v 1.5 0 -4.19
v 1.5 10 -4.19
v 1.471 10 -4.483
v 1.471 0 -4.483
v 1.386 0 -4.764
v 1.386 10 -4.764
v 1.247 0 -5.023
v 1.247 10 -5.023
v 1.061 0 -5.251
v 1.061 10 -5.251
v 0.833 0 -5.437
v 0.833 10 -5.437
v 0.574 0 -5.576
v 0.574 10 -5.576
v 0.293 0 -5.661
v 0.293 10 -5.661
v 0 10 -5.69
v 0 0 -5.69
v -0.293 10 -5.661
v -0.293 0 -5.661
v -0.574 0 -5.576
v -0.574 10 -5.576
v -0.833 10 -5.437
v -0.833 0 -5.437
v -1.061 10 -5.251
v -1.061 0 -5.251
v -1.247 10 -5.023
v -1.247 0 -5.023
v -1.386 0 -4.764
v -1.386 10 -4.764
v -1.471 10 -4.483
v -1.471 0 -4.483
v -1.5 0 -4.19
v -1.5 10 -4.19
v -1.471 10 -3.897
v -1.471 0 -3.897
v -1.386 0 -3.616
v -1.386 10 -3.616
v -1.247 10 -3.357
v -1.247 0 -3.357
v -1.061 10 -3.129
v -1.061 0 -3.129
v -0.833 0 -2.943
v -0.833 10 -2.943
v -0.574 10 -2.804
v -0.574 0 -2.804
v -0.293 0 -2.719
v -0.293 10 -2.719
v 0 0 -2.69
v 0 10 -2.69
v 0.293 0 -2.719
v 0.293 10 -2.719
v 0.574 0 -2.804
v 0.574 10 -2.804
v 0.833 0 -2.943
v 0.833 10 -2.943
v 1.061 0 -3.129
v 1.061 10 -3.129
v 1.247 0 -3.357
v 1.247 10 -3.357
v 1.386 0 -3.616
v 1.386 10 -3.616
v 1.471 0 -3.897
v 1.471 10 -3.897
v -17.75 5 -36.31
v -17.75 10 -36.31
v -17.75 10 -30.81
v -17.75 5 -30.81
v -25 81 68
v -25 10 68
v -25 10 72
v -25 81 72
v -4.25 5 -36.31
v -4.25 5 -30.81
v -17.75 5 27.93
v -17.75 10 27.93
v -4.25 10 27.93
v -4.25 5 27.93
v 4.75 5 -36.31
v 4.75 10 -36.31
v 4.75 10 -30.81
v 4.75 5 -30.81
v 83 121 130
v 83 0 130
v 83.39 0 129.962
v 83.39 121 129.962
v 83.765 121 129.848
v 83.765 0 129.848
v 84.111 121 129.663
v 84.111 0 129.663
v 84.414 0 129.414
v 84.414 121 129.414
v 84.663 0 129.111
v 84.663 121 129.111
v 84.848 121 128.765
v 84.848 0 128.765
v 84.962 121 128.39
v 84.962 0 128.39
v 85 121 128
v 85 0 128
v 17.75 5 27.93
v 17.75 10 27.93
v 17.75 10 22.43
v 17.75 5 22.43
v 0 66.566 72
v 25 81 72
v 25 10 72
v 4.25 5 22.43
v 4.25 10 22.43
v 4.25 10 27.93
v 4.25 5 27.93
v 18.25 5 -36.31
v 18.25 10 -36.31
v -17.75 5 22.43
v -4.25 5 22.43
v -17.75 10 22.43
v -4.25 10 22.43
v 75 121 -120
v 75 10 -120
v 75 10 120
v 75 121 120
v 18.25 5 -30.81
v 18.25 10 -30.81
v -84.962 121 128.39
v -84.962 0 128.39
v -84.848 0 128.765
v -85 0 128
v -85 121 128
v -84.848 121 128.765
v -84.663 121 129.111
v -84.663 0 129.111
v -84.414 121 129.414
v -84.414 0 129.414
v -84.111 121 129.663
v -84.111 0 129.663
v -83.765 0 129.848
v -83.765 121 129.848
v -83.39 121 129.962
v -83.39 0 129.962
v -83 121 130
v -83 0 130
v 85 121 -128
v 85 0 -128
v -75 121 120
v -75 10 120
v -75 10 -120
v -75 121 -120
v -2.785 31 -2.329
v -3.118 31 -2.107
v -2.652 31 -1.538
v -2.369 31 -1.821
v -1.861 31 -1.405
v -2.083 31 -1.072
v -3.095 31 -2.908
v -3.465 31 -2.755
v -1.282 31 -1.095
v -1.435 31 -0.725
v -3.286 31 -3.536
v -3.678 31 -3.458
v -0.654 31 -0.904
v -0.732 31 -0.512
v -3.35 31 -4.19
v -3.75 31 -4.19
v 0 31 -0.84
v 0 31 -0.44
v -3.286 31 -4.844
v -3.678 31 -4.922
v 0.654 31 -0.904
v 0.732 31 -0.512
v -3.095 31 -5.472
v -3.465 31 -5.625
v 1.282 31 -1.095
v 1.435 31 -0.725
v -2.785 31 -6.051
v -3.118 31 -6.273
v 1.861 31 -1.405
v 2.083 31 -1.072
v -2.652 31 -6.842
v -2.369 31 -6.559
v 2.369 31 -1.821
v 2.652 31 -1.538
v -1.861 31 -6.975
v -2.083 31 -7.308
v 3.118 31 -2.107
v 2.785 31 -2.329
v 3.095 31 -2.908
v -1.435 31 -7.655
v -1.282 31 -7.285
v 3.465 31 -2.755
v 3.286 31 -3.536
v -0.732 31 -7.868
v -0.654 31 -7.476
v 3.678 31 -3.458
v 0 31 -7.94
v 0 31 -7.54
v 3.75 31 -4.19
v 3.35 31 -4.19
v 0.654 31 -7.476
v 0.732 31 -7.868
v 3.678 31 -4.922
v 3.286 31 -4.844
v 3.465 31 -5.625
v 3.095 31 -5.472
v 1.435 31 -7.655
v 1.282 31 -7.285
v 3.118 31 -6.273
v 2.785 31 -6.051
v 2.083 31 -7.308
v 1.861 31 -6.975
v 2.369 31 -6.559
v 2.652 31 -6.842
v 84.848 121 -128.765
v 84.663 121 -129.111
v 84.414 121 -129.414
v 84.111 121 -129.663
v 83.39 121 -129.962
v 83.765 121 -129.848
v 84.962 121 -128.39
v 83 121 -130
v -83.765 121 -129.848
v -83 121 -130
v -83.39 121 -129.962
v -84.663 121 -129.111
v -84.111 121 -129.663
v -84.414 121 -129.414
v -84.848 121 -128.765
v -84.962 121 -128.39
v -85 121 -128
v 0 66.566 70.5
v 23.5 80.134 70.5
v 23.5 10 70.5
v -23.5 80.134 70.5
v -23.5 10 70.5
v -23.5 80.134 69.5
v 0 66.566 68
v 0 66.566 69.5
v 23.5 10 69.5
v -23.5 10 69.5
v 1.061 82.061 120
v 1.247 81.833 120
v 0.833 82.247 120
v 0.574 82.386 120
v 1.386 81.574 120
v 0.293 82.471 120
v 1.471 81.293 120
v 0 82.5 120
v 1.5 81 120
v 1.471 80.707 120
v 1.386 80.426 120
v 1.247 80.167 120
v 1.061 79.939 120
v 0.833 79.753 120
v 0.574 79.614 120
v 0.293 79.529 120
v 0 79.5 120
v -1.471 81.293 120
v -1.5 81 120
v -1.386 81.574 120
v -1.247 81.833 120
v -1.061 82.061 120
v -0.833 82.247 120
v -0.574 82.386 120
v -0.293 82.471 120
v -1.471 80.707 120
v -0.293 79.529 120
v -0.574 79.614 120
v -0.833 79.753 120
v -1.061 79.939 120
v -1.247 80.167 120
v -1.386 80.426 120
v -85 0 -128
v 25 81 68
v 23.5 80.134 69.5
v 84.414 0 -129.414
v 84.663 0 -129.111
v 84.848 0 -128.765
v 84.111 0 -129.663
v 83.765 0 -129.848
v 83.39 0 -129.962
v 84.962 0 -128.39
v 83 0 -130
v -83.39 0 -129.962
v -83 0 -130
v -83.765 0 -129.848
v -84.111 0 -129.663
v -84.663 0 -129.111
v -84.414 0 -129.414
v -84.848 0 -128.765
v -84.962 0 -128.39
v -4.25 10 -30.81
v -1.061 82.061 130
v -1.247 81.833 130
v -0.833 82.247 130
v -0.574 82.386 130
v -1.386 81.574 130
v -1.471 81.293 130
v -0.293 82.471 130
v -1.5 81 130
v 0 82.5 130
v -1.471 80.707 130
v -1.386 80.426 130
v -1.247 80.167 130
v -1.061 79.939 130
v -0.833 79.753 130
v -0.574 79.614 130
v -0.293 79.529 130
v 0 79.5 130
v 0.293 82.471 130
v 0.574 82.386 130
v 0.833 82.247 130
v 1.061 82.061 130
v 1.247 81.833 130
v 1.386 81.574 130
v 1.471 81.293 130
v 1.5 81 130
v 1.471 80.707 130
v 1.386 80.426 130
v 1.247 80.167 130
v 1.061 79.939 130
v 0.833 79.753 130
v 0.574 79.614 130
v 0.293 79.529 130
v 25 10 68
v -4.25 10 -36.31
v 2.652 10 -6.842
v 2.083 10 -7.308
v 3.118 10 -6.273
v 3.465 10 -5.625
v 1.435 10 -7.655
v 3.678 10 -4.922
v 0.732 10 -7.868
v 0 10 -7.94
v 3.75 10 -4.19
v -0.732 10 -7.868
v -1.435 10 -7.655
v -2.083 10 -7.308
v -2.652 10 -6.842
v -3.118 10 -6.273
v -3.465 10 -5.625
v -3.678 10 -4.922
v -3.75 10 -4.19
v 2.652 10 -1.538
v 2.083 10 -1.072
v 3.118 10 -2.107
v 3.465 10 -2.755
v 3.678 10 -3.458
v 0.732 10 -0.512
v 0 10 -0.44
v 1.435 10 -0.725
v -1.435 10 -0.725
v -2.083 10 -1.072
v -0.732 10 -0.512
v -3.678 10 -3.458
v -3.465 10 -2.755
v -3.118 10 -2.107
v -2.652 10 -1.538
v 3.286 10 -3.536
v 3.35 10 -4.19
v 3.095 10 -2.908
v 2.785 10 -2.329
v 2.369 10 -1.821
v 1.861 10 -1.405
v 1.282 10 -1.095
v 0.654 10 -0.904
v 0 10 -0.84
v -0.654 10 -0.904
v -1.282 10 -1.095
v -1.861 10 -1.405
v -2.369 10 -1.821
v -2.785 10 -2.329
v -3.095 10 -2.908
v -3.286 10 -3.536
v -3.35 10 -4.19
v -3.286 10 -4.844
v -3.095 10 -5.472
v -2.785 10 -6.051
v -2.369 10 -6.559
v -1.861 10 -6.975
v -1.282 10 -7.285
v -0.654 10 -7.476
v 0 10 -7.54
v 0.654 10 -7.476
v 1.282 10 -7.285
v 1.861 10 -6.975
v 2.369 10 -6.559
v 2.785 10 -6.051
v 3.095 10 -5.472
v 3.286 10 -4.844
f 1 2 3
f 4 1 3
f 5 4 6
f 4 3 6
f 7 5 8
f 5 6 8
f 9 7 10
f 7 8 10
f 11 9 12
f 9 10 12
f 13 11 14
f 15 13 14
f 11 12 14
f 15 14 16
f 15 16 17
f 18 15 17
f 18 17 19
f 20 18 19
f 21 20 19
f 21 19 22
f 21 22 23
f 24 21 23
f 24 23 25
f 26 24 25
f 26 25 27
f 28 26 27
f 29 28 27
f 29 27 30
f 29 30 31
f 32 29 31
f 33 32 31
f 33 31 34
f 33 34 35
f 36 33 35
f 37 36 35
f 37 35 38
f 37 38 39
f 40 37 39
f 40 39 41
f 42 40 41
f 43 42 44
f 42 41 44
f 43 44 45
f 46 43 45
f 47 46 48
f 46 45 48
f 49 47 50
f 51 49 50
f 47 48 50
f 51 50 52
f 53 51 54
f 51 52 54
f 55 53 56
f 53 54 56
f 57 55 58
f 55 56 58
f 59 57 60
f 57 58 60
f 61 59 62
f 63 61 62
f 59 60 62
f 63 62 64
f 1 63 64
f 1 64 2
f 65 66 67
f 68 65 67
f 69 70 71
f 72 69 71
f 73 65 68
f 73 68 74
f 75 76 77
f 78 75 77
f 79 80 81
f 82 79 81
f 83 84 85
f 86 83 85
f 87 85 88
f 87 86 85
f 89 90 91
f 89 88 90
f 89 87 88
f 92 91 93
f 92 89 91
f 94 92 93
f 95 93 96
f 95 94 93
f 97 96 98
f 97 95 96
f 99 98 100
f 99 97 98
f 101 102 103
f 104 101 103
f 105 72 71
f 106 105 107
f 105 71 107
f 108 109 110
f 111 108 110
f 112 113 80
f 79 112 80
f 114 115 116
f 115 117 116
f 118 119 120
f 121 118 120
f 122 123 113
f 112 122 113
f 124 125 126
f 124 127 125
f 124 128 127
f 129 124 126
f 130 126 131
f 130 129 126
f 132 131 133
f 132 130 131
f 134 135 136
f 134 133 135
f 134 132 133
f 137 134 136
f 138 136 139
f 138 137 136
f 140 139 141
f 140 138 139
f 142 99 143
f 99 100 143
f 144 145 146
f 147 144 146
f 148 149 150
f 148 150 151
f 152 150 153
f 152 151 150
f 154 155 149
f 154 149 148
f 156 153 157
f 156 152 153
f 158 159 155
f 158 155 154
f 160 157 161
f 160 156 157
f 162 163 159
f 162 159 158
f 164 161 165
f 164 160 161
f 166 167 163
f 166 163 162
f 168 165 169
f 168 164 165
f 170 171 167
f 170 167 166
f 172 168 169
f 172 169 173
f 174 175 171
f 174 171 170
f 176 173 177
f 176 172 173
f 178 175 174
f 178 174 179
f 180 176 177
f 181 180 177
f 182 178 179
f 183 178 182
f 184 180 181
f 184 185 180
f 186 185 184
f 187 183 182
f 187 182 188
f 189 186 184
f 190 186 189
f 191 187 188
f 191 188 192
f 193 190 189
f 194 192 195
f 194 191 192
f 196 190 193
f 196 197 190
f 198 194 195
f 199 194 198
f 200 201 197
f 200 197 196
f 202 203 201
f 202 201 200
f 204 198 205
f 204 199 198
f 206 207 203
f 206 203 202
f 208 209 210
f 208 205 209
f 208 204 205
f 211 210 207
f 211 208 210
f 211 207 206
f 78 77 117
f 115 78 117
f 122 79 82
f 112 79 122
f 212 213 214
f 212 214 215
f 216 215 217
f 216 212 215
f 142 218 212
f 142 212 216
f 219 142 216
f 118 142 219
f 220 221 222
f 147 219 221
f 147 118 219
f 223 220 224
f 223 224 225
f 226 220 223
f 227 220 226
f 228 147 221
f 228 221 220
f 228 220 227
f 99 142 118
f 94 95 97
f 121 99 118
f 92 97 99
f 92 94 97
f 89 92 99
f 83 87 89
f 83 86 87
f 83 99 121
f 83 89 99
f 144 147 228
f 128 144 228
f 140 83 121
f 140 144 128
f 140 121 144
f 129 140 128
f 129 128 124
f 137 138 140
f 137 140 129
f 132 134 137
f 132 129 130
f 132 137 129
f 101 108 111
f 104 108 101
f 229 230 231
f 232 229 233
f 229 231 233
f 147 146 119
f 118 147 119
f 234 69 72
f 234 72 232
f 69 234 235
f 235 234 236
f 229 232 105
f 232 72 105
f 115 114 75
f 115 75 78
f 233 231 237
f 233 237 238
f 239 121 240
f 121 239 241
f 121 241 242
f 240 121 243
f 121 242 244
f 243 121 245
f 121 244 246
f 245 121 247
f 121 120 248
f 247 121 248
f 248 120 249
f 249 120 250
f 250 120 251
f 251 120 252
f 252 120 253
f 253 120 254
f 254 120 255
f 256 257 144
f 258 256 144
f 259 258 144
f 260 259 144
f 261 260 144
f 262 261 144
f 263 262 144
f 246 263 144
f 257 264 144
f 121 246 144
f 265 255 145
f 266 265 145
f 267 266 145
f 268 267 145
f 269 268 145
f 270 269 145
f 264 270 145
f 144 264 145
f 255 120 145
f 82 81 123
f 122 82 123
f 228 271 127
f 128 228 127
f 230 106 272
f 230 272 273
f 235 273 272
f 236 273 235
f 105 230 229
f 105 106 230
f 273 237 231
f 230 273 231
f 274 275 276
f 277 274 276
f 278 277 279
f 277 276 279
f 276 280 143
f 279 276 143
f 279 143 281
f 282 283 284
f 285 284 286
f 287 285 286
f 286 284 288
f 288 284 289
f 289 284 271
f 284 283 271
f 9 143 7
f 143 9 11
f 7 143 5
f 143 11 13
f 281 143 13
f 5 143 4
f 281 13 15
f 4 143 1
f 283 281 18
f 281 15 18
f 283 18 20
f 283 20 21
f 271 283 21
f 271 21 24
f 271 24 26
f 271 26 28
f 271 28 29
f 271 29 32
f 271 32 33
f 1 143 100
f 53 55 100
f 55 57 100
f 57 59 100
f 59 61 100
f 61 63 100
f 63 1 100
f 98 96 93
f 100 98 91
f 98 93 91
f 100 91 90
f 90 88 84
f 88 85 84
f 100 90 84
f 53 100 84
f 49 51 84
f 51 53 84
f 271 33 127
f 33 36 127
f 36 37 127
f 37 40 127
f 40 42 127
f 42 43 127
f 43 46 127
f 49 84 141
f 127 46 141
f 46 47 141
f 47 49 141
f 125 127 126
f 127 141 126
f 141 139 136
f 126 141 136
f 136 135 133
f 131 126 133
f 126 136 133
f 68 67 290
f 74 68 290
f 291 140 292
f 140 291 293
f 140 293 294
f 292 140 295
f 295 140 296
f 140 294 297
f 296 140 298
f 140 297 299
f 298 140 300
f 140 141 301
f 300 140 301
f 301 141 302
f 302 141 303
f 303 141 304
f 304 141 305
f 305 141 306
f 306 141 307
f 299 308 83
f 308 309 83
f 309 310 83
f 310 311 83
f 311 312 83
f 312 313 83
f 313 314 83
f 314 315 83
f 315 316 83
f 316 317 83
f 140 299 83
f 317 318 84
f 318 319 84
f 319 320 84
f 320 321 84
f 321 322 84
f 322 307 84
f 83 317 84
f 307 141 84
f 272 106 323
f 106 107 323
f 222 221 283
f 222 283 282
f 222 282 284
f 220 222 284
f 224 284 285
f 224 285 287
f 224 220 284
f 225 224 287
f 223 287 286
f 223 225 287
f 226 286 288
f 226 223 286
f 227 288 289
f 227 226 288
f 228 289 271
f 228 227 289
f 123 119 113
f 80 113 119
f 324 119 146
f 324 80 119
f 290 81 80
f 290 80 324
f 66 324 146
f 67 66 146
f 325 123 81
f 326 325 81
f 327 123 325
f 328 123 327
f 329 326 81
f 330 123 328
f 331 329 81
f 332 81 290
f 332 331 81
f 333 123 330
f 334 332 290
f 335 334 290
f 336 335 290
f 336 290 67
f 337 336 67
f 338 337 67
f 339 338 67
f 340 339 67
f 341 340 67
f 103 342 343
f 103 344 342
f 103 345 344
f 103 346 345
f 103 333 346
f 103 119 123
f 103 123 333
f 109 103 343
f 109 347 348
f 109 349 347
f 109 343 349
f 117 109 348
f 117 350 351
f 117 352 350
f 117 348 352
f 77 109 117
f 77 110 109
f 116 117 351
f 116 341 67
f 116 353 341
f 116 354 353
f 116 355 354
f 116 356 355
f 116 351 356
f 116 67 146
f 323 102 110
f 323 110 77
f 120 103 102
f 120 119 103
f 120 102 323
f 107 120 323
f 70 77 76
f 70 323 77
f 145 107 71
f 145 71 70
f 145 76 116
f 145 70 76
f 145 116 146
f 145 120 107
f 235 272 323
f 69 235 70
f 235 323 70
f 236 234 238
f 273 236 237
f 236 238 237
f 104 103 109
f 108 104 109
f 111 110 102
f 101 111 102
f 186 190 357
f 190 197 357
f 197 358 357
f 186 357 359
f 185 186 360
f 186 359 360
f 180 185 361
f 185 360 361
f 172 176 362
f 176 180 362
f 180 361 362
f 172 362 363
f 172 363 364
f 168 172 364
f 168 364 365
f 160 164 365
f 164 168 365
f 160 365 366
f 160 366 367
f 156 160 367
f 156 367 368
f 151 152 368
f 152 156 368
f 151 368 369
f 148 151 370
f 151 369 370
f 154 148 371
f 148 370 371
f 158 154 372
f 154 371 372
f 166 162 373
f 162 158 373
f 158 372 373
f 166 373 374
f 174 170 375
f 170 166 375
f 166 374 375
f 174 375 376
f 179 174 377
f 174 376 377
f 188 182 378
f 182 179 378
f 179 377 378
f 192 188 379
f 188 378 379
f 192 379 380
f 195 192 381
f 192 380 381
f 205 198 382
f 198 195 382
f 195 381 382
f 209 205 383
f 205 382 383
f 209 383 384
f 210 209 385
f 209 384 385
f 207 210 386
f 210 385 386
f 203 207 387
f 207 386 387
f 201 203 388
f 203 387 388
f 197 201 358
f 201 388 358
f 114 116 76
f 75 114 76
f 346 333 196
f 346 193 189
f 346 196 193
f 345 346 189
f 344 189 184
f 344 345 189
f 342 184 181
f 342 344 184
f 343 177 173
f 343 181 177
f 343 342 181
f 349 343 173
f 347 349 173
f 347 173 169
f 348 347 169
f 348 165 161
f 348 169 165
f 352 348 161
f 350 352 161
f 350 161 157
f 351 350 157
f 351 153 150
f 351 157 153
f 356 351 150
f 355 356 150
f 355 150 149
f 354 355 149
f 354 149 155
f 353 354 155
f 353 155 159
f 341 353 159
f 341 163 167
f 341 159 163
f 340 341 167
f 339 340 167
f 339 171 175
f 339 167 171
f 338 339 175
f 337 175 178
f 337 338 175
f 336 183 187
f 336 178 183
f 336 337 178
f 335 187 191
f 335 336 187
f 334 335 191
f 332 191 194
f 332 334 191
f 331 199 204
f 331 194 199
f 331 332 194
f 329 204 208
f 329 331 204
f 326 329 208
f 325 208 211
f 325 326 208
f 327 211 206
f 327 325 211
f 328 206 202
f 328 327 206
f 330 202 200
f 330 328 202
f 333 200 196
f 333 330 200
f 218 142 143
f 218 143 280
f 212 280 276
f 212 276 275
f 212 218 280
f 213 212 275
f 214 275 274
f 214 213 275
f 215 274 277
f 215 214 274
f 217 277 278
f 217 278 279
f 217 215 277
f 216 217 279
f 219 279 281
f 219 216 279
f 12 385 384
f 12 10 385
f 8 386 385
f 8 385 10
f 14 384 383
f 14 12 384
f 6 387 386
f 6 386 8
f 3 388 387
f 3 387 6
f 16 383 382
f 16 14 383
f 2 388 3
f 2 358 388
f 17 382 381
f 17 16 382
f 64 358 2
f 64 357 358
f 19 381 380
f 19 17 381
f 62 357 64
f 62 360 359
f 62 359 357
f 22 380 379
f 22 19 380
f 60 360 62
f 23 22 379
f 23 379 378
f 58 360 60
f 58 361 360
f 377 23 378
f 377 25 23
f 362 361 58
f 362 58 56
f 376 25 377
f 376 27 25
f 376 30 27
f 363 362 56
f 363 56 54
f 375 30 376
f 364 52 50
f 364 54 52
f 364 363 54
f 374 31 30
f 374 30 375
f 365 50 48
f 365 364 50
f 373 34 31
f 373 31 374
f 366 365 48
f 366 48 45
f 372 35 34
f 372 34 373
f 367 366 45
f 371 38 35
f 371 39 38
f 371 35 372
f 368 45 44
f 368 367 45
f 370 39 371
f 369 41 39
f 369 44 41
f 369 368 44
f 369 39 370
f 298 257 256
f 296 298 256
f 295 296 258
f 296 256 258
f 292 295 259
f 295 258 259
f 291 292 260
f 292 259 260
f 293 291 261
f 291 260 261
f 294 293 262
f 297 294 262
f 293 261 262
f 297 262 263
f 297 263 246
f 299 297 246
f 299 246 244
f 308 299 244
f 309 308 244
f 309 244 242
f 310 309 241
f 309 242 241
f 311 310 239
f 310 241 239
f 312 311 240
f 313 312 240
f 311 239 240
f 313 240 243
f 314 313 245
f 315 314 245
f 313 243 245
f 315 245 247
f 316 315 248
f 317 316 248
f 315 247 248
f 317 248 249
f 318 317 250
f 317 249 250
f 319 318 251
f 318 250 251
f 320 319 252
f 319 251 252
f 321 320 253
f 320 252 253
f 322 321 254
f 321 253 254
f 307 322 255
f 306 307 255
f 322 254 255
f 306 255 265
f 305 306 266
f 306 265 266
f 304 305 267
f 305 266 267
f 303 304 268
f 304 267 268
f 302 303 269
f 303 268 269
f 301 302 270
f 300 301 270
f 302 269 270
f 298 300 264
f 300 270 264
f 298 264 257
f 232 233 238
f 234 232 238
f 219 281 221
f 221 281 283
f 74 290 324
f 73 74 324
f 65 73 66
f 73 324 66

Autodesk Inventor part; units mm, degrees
ref_plane "YZ Plane" through (0, 0, 0) normal (1, 0, 0) x (0, 1, 0)
ref_plane "XZ Plane" through (0, 0, 0) normal (0, 1, 0) x (-1, 0, 0)
ref_plane "XY Plane" through (0, 0, 0) normal (0, 0, 1) x (1, 0, 0)
sketch "Boceto1" plane through (0, 0, 0) normal (0, 1, 0) x (-1, 0, 0)
  line L0 (-85, -130) -> (85, -130)
  line L1 (85, -130) -> (85, 130)
  line L2 (85, 130) -> (-85, 130)
  line L3 (-85, 130) -> (-85, -130)
  line L4 (-85, -130) -> (85, 130) construction
  line L5 (85, -130) -> (-85, 130) construction
  line L6 (75, 120) -> (75, -120)
  line L7 (75, -120) -> (-75, -120)
  line L8 (-75, -120) -> (-75, 120)
  line L9 (-75, 120) -> (75, 120)
  point P0 (0, 0)
  point P1 (0, -120)
  point P2 (0, 120)
  point P3 (0, 0)
  dimension "d0" = 170
  dimension "d1" = 260
  dimension "d10" = 10
extrude "Extrusión1" add sketch "Boceto1" along normal blind 121
extrude "Extrusión3" add sketch "Boceto1" along normal blind 10 contours L6 L7 L8 L9
sketch "Boceto4" plane through (0, 10, 0) normal (0, 1, 0) x (1, 0, 0)
  circle A0 centre (0, 4.19) radius 3.75
  line L0 (85, 130) -> (-85, 130) projected
  circle A1 centre (0, 4.19) radius 3.35
  circle A2 centre (0, 4.19) radius 1.5
  line L1 (-85, -130) -> (85, -130) projected
  line L2 (75, -120) -> (-75, -120) construction
  line L3 (0, -120) -> (0, -70) construction
  point P0 (0, 0)
  dimension "d15" = 7.5
  dimension "d17" = 0.4
  dimension "d20" = 3
  dimension "d23" = 134.19
  dimension "d36" = 50
extrude "Extrusión4" add sketch "Boceto4" along normal blind 21 contours A0
extrude "Extrusión5" cut sketch "Boceto4" against normal blind 10 contours A2
sketch "Boceto7" plane through (0, 10, 0) normal (0, 1, 0) x (1, 0, 0)
  circle A0 centre (0, 4.19) radius 1.5 construction
  line L0 (0, 4.19) -> (-17.5, 4.19) construction
  circle A1 centre (0, 4.19) radius 1.5 construction
  line L1 (0, 4.19) -> (0, -27.68) construction
  line L2 (75, -120) -> (-75, -120) construction
  line L3 (0, -120) -> (0, -70) construction
  line L4 (0, -70) -> (-19.0745, -70) construction
  line L5 (25, -68) -> (-25, -68)
  line L6 (-25, -68) -> (-25, -72)
  line L7 (-25, -72) -> (25, -72)
  line L8 (25, -72) -> (25, -68)
  line L9 (25, -68) -> (-25, -72) construction
  line L10 (-25, -68) -> (25, -72) construction
  line L11 (-23.5, -70.5) -> (-23.5, -69.5)
  line L12 (-23.5, -69.5) -> (23.5, -69.5)
  line L13 (23.5, -69.5) -> (23.5, -70.5)
  line L14 (23.5, -70.5) -> (-23.5, -70.5)
  line L15 (-4.25, -22.43) -> (-17.75, -22.43)
  line L16 (-17.75, -22.43) -> (-17.75, -27.93)
  line L17 (-17.75, -27.93) -> (-4.25, -27.93)
  line L18 (-4.25, -27.93) -> (-4.25, -22.43)
  line L19 (17.75, -22.43) -> (4.25, -22.43)
  line L20 (4.25, -22.43) -> (4.25, -27.93)
  line L21 (4.25, -27.93) -> (17.75, -27.93)
  line L22 (17.75, -27.93) -> (17.75, -22.43)
  line L23 (-4.25, 36.31) -> (-17.75, 36.31)
  line L24 (-17.75, 36.31) -> (-17.75, 30.81)
  line L25 (-17.75, 30.81) -> (-4.25, 30.81)
  line L26 (-4.25, 30.81) -> (-4.25, 36.31)
  line L27 (18.25, 36.31) -> (4.75, 36.31)
  line L28 (4.75, 36.31) -> (4.75, 30.81)
  line L29 (4.75, 30.81) -> (18.25, 30.81)
  line L30 (18.25, 30.81) -> (18.25, 36.31)
  point P0 (0, 0)
  dimension "d43" = 31.87
  dimension "d44" = 50
  dimension "d45" = 50
  dimension "d46" = 4
  dimension "d47" = 1.5
  dimension "d100" = 13.5
  dimension "d101" = 5.5
  dimension "d102" = 13.5
  dimension "d103" = 5.5
  dimension "d104" = 13.5
  dimension "d105" = 5.5
  dimension "d106" = 13.5
  dimension "d107" = 5.5
sketch "Boceto8" plane through (75, 121, 120) normal (0, 0, -1) x (-1, 0, 0)
  line L0 (0, -111) -> (150, -111) construction
  line L1 (75, -111) -> (75, -11) construction
  circle A0 centre (75, -40) radius 5
  circle A1 centre (75, -40) radius 1.5
  point P0 (75, -121)
  dimension "d37" = 100
  dimension "d38" = 10
  dimension "d75" = 3
extrude "Extrusión9" add sketch "Boceto7" along normal blind 71 contours L8 L7 L6 L5
sketch "Boceto9" plane through (-25, 10, 72) normal (0, 0, 1) x (1, 0, 0)
  line L0 (0, 71) -> (25, 56.5662)
  line L1 (0, 71) -> (57.416, 71) construction
  line L2 (50, 71) -> (25, 56.5662)
  line L3 (50, 71) -> (104.7106, 71) construction
  arc A0 (48.8838, 70.3556) -> (1.1162, 70.3556) centre (25, 56.5662) ccw
  line L4 (0, 71) -> (1.5, 71)
  line L5 (0, 71) -> (50, 71) projected
  line L6 (50, 71) -> (48.5, 71)
  point P0 (25, -10)
extrude "Extrusión11" add sketch "Boceto9" against normal blind 4 contours A0 L5 L2 L0 | A0 L5
extrude "Extrusión12" cut sketch "Boceto9" against normal blind 4 contours A0 L5 L2 L0 | A0 L5
extrude "Extrusión13" cut sketch "Boceto9" against normal blind 4 contours L4 A0 L0
extrude "Extrusión14" cut sketch "Boceto9" against normal blind 4 contours L5 L2 A0
extrude "Extrusión15" [suppressed]
extrude "Extrusión16" [suppressed]
fillet "Empalme1" radius 2 4 edges at (85, 60.5, 130) (-85, 60.5, 130) (85, 60.5, -130) (-85, 60.5, -130)
extrude "Extrusión17" cut sketch "Boceto8" against normal through all contours A1
extrude "Extrusión20" cut sketch "Boceto7" against normal blind 5 contours L18 L17 L16 L15 | L22 L21 L20 L19 | L26 L25 L24 L23 | L30 L29 L28 L27
properties part number "BoxDark"
